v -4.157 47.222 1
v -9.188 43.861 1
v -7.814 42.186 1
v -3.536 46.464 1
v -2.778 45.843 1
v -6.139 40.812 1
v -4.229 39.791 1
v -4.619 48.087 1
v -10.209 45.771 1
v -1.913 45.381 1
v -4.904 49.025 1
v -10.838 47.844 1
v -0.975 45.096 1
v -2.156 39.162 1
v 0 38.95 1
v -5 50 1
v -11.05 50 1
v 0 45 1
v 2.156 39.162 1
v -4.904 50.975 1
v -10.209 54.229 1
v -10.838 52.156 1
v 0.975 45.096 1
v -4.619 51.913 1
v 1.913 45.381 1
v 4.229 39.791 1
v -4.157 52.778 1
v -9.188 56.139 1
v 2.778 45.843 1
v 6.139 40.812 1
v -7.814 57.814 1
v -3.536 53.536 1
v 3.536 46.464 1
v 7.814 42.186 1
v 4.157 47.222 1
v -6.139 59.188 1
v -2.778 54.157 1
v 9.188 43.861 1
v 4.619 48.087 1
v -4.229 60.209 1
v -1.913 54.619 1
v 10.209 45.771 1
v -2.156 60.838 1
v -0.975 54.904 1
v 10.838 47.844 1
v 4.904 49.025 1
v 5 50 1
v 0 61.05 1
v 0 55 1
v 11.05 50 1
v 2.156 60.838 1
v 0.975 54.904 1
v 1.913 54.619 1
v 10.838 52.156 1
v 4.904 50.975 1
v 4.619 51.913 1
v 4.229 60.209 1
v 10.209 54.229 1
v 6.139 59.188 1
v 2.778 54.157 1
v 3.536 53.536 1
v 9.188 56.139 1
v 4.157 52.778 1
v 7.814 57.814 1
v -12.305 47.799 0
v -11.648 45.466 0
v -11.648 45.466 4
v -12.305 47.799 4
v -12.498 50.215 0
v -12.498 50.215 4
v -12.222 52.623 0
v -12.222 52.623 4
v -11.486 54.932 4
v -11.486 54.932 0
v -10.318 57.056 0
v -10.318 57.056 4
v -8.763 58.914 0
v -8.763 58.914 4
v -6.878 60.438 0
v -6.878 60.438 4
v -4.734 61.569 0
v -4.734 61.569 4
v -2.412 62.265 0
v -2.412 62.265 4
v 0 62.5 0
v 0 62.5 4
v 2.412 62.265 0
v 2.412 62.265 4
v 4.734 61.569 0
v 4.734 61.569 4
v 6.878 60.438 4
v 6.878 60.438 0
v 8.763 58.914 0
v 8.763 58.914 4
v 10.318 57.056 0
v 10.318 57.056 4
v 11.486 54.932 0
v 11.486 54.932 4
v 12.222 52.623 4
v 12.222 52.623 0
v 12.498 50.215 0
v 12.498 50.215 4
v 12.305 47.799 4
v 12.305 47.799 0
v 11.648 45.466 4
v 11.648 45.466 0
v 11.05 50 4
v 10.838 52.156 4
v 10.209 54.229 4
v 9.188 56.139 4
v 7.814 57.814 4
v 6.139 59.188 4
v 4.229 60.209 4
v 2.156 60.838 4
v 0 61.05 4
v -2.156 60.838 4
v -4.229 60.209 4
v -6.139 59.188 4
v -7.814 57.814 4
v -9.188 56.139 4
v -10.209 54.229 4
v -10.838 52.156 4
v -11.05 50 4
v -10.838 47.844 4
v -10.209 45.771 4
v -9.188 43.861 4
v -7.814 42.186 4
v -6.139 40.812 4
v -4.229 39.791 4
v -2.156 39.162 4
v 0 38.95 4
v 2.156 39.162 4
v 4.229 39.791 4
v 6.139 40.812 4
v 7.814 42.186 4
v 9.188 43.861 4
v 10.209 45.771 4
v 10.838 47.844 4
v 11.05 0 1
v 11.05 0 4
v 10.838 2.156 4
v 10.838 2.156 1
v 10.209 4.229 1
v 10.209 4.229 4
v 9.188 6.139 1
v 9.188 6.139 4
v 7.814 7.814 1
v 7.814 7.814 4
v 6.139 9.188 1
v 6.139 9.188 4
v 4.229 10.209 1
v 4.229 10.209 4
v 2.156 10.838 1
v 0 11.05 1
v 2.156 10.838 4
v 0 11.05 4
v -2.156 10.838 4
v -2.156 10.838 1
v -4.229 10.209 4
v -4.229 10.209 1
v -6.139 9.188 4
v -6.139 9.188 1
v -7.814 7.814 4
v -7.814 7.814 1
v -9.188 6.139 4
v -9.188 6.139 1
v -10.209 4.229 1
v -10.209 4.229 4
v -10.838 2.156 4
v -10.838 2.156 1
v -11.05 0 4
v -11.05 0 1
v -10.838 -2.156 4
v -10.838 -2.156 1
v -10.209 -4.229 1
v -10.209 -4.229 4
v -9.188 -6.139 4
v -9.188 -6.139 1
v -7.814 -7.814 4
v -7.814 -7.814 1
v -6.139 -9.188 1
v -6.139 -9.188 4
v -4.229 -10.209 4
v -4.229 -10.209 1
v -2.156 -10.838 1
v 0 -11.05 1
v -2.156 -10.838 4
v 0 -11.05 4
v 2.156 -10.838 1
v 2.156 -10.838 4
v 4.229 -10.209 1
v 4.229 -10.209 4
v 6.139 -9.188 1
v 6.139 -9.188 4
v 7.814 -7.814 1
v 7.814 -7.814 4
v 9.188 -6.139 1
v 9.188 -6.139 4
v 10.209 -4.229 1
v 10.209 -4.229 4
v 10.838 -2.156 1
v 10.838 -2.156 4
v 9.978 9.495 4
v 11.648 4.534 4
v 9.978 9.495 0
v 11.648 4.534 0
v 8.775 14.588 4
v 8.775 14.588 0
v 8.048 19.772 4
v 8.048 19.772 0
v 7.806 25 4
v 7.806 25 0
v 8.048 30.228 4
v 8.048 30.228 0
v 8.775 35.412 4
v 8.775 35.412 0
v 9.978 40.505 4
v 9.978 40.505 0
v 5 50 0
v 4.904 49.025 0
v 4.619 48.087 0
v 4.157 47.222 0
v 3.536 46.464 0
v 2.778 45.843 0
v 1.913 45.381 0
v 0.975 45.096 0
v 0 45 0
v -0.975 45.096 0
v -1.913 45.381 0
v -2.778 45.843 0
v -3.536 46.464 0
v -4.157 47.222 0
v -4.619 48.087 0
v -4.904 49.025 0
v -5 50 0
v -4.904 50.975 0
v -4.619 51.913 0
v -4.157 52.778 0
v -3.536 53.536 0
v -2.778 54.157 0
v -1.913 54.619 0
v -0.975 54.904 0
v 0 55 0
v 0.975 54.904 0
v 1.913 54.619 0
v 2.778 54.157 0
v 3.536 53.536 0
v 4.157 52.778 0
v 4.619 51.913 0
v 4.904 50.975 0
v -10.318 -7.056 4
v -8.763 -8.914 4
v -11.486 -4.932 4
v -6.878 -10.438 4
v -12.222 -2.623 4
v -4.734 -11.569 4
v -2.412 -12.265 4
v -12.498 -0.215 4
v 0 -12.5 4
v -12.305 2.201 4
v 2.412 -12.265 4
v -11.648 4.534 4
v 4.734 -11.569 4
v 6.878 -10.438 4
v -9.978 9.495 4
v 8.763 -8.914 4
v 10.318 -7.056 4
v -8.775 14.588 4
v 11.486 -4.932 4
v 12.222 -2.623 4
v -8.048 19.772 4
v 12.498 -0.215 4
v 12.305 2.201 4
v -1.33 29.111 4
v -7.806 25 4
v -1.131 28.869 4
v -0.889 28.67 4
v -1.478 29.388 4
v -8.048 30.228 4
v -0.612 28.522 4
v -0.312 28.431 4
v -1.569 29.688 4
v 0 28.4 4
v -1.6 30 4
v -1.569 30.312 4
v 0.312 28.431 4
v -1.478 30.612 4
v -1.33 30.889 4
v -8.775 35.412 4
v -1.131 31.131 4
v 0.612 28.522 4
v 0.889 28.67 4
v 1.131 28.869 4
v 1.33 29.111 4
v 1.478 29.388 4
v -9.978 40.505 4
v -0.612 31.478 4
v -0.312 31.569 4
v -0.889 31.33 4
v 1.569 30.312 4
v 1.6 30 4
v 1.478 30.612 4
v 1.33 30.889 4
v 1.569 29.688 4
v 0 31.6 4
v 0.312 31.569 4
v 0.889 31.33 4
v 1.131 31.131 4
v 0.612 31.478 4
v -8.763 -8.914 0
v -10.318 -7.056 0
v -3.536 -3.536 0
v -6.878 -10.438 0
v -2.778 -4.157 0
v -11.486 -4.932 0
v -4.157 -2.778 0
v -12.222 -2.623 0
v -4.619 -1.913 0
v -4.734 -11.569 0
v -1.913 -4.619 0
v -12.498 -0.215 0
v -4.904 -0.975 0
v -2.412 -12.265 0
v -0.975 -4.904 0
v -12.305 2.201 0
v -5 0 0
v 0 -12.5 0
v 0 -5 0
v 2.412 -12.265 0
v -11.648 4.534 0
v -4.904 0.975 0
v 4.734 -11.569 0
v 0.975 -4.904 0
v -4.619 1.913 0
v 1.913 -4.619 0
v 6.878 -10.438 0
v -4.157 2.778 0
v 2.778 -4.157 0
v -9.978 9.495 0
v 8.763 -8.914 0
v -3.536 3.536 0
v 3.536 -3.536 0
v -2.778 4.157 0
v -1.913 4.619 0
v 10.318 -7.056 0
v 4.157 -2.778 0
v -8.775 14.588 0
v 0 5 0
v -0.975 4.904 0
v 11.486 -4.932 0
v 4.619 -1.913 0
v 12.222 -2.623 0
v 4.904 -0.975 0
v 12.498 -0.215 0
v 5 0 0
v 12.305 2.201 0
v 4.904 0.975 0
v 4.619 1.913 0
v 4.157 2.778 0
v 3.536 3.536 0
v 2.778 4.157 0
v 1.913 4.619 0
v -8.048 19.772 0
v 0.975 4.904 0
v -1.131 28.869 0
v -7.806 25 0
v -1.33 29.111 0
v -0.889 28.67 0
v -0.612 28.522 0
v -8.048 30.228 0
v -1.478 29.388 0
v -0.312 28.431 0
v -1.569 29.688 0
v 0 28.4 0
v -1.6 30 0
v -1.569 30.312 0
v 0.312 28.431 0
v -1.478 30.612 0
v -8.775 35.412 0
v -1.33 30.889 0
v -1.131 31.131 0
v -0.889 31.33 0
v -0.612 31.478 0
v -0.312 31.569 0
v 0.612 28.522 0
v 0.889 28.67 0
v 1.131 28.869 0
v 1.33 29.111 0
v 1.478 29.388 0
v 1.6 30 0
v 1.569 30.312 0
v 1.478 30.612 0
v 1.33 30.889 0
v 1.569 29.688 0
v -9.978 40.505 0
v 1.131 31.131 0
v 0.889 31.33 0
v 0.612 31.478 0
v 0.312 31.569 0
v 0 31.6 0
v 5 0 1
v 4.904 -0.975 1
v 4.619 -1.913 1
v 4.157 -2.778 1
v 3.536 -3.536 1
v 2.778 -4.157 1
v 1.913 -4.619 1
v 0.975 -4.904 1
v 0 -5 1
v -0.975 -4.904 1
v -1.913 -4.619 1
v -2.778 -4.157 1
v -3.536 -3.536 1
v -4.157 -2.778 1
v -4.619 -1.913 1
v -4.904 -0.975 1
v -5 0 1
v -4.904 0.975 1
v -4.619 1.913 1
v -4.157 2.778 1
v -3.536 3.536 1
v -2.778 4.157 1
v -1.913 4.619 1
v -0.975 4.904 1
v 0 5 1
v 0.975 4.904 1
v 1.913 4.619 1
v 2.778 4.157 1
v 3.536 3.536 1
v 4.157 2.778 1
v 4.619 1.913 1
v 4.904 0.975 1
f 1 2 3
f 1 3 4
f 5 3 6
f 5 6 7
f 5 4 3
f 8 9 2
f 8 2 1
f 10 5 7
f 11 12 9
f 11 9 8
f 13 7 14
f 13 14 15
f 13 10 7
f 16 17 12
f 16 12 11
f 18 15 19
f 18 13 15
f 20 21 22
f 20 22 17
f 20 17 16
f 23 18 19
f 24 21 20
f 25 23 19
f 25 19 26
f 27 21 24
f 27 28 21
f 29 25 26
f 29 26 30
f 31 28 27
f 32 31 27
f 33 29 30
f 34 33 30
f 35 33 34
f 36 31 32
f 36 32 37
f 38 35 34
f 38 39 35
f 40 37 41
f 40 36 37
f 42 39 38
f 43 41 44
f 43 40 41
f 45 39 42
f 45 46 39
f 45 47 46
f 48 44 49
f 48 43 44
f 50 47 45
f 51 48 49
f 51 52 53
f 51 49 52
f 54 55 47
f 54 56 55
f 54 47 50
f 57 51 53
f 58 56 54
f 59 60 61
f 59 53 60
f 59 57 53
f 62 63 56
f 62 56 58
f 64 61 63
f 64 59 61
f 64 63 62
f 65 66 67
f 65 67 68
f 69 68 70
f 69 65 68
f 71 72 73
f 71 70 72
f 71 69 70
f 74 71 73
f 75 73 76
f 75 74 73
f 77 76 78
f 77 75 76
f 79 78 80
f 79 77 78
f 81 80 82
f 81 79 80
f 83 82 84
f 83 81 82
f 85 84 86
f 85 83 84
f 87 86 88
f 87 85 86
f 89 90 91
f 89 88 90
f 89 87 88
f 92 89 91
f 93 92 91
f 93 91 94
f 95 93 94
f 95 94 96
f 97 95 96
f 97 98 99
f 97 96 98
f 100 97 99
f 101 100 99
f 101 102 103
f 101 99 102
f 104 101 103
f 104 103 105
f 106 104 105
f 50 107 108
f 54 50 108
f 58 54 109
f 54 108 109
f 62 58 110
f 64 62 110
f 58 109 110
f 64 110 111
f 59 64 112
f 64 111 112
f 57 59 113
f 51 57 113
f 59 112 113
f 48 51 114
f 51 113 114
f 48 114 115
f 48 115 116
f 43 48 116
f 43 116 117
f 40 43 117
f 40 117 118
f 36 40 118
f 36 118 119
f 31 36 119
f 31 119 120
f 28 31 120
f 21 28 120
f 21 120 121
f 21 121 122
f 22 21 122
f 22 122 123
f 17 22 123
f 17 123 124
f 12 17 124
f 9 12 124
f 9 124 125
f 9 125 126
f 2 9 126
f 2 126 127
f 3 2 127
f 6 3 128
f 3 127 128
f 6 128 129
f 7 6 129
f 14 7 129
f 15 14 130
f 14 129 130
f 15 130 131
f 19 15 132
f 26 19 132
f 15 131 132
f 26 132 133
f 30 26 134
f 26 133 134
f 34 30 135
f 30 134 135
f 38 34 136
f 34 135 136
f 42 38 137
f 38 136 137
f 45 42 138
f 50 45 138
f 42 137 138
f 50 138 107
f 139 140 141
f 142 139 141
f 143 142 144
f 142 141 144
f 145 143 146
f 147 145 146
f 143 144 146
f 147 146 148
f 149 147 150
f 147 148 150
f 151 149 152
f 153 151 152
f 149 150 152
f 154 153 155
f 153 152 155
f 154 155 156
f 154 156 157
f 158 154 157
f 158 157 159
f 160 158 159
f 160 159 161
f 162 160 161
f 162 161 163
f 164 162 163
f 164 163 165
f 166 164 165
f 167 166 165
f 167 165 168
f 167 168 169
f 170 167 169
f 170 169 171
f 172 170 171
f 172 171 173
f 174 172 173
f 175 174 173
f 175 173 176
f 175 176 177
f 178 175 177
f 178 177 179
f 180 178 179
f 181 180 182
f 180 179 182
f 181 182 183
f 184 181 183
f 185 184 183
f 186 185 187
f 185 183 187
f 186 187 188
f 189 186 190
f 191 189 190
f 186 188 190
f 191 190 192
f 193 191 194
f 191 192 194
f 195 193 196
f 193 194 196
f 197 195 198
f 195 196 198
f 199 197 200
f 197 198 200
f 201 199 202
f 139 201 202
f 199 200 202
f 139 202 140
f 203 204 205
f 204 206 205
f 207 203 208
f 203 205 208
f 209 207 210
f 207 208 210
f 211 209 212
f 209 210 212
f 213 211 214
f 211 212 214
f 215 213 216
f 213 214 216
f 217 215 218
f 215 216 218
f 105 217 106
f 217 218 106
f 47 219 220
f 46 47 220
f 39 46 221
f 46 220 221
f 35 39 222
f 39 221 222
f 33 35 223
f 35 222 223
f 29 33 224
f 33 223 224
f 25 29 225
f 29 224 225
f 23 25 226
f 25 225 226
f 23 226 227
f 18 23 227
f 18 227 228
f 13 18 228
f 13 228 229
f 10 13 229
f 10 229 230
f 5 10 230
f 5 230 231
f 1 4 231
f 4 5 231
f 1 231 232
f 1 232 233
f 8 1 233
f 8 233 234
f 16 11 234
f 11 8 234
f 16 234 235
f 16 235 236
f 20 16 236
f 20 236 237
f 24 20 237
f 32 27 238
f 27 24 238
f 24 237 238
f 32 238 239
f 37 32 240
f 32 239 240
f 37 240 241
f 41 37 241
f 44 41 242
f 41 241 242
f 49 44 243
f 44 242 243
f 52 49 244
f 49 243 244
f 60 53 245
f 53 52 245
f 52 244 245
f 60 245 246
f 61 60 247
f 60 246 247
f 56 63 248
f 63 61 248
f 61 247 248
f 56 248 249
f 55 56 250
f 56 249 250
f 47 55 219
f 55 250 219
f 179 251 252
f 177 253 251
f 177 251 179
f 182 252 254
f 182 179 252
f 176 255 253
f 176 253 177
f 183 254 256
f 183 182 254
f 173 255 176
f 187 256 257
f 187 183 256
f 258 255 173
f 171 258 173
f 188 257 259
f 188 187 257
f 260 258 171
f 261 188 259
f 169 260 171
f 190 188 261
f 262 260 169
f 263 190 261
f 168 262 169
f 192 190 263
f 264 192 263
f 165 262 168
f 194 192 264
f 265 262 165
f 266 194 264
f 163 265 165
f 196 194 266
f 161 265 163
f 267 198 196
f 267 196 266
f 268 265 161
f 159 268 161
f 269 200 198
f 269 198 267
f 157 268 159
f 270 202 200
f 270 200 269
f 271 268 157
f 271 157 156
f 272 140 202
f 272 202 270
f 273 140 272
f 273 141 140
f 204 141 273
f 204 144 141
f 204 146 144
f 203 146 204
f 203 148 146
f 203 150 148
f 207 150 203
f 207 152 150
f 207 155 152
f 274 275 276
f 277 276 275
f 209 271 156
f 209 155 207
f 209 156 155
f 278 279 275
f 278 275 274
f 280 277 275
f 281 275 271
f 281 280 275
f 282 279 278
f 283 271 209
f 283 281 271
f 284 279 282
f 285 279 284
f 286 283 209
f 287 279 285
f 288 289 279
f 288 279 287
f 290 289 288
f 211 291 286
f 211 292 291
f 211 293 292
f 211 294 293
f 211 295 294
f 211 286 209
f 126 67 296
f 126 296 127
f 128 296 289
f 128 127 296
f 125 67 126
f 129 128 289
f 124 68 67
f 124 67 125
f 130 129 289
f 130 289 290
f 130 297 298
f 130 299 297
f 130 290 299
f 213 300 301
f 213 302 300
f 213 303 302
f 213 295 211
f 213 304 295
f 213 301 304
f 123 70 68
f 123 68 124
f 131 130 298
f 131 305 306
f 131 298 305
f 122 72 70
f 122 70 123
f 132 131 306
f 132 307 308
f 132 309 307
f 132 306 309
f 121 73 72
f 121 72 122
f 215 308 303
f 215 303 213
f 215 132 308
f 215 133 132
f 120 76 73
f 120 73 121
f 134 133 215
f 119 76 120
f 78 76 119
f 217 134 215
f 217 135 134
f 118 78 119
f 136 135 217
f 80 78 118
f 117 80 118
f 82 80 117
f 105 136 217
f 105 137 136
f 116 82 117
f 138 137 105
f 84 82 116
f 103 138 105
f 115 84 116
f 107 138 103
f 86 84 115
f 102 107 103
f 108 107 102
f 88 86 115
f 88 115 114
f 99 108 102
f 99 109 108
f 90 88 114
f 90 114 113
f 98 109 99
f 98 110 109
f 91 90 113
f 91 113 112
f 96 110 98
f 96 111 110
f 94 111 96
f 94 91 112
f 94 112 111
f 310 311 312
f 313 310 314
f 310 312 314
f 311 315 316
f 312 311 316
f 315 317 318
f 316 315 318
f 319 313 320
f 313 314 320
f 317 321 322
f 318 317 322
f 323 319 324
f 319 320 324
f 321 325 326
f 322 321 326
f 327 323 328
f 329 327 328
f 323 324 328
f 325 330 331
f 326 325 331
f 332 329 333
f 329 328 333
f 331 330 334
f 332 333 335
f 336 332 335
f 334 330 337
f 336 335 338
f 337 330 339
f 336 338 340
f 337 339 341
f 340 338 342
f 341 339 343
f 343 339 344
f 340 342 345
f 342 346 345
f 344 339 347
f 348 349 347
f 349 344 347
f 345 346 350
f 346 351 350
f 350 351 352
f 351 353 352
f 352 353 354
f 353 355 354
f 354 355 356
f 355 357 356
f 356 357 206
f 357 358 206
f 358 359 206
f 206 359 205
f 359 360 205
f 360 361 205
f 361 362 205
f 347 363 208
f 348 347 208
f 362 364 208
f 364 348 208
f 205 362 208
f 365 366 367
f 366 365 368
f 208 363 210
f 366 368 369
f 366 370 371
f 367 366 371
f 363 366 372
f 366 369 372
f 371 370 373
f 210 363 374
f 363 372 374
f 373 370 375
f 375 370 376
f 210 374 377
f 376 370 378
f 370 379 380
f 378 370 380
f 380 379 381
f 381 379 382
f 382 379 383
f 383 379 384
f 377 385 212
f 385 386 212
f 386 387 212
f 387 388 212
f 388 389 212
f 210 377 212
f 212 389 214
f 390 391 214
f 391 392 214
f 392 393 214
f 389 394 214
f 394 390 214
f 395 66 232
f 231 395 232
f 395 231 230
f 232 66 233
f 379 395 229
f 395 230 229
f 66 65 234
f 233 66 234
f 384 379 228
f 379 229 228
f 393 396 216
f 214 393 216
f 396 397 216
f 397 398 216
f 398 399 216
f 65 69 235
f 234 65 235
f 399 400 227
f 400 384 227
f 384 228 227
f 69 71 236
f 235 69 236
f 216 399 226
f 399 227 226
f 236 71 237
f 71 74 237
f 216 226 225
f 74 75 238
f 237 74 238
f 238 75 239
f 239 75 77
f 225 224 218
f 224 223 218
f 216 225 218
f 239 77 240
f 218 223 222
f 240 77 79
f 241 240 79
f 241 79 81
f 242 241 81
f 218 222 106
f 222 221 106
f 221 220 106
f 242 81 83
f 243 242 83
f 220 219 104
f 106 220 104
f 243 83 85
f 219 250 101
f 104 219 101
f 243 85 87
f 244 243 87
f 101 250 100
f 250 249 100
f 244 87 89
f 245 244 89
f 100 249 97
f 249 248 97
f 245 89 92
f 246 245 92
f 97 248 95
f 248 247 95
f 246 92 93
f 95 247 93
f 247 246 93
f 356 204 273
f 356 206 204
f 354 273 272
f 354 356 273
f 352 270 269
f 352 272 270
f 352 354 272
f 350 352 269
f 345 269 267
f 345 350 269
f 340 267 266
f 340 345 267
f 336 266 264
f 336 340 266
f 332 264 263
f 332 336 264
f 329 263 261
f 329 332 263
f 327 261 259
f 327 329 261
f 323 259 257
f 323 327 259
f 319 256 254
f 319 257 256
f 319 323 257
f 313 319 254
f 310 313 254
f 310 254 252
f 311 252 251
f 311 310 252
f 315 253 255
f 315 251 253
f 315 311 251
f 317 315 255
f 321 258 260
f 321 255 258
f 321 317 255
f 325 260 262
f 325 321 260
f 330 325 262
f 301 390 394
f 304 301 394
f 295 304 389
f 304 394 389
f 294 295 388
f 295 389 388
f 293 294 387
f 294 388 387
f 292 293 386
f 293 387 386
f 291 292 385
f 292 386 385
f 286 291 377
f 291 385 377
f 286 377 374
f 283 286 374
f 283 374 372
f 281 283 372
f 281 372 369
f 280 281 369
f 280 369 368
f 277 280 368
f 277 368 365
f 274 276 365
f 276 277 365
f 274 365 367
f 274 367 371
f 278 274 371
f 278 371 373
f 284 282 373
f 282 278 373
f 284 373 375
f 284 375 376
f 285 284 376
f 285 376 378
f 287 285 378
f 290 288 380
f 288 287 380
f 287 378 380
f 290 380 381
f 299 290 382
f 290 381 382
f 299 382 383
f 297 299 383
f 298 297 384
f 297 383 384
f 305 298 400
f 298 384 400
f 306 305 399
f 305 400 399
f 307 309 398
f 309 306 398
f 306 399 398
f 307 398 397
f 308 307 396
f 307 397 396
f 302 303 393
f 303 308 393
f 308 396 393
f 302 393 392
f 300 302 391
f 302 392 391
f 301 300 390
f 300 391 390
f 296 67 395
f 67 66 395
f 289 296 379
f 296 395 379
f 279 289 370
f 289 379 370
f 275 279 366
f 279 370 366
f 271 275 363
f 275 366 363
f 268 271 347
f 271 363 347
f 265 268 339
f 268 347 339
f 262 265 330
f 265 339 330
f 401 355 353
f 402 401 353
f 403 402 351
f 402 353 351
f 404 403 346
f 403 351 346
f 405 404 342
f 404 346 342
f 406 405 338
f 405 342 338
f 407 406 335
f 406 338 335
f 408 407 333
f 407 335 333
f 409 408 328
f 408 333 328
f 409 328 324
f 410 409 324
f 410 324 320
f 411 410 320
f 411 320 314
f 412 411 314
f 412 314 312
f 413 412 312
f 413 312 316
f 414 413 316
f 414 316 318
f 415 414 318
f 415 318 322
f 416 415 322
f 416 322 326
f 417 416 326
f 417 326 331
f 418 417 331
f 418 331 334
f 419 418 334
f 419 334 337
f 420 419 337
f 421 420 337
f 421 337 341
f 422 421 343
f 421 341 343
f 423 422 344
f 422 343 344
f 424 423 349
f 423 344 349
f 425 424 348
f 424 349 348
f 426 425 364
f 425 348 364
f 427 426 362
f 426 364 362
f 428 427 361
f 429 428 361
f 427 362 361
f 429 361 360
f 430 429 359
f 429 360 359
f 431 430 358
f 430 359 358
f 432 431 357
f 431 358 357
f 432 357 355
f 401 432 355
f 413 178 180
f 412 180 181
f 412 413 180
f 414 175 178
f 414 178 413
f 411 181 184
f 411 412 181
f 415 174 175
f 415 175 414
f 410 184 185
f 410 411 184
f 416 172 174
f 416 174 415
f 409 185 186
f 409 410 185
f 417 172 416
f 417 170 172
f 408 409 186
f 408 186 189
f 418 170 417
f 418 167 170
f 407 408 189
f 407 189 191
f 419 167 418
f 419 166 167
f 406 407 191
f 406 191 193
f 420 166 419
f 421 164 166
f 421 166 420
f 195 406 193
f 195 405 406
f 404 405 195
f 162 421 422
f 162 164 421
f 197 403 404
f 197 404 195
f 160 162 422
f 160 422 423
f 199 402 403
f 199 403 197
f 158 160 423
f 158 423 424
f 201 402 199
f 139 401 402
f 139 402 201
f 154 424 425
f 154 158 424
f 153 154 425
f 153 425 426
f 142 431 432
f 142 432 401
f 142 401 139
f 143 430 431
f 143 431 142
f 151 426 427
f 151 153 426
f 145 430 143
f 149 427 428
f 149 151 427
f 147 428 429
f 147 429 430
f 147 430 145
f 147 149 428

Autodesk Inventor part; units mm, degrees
ref_plane "YZ Plane" through (0, 0, 0) normal (1, 0, 0) x (0, 1, 0)
ref_plane "XZ Plane" through (0, 0, 0) normal (0, 1, 0) x (-1, 0, 0)
ref_plane "XY Plane" through (0, 0, 0) normal (0, 0, 1) x (1, 0, 0)
sketch "スケッチ1" plane through (0, 0, 0) normal (0, 0, 1) x (1, 0, 0)
  circle A0 centre (0, 0) radius 5
  circle A1 centre (0, 50) radius 5
  arc A2 (11.6485, 45.4655) -> (-11.6485, 45.4655) centre (0, 50) ccw
  arc A3 (-11.6485, 4.5345) -> (11.6485, 4.5345) centre (0, 0) ccw
  circle A4 centre (0, 30) radius 1.6
  circle A5 centre (0, 30) radius 8 construction
  arc A6 (-11.6485, 4.5345) -> (-11.6485, 45.4655) centre (-64.2223, 25) ccw
  arc A7 (11.6485, 45.4655) -> (11.6485, 4.5345) centre (64.2223, 25) ccw
  dimension "d0" = 10
  dimension "d1" = 10
  dimension "d2" = 50
  dimension "d3" = 12.5
  dimension "d4" = 12.5
  dimension "d11" = 3.2
  dimension "d12" = 20
  dimension "d13" = 16
extrude "押し出し1" add sketch "スケッチ1" along normal blind 4
sketch "スケッチ2" plane through (0, 0, 4) normal (0, 0, 1) x (1, 0, 0)
  circle A0 centre (0, 0) radius 11.05
  circle A1 centre (0, 50) radius 5 projected
  circle A2 centre (0, 50) radius 11.05
  dimension "d7" = 22.1
  dimension "d8" = 22.1
extrude "押し出し2" cut sketch "スケッチ2" against normal blind 3
properties part number "ハンド_リンク1" material "アルミニウム 6061"
